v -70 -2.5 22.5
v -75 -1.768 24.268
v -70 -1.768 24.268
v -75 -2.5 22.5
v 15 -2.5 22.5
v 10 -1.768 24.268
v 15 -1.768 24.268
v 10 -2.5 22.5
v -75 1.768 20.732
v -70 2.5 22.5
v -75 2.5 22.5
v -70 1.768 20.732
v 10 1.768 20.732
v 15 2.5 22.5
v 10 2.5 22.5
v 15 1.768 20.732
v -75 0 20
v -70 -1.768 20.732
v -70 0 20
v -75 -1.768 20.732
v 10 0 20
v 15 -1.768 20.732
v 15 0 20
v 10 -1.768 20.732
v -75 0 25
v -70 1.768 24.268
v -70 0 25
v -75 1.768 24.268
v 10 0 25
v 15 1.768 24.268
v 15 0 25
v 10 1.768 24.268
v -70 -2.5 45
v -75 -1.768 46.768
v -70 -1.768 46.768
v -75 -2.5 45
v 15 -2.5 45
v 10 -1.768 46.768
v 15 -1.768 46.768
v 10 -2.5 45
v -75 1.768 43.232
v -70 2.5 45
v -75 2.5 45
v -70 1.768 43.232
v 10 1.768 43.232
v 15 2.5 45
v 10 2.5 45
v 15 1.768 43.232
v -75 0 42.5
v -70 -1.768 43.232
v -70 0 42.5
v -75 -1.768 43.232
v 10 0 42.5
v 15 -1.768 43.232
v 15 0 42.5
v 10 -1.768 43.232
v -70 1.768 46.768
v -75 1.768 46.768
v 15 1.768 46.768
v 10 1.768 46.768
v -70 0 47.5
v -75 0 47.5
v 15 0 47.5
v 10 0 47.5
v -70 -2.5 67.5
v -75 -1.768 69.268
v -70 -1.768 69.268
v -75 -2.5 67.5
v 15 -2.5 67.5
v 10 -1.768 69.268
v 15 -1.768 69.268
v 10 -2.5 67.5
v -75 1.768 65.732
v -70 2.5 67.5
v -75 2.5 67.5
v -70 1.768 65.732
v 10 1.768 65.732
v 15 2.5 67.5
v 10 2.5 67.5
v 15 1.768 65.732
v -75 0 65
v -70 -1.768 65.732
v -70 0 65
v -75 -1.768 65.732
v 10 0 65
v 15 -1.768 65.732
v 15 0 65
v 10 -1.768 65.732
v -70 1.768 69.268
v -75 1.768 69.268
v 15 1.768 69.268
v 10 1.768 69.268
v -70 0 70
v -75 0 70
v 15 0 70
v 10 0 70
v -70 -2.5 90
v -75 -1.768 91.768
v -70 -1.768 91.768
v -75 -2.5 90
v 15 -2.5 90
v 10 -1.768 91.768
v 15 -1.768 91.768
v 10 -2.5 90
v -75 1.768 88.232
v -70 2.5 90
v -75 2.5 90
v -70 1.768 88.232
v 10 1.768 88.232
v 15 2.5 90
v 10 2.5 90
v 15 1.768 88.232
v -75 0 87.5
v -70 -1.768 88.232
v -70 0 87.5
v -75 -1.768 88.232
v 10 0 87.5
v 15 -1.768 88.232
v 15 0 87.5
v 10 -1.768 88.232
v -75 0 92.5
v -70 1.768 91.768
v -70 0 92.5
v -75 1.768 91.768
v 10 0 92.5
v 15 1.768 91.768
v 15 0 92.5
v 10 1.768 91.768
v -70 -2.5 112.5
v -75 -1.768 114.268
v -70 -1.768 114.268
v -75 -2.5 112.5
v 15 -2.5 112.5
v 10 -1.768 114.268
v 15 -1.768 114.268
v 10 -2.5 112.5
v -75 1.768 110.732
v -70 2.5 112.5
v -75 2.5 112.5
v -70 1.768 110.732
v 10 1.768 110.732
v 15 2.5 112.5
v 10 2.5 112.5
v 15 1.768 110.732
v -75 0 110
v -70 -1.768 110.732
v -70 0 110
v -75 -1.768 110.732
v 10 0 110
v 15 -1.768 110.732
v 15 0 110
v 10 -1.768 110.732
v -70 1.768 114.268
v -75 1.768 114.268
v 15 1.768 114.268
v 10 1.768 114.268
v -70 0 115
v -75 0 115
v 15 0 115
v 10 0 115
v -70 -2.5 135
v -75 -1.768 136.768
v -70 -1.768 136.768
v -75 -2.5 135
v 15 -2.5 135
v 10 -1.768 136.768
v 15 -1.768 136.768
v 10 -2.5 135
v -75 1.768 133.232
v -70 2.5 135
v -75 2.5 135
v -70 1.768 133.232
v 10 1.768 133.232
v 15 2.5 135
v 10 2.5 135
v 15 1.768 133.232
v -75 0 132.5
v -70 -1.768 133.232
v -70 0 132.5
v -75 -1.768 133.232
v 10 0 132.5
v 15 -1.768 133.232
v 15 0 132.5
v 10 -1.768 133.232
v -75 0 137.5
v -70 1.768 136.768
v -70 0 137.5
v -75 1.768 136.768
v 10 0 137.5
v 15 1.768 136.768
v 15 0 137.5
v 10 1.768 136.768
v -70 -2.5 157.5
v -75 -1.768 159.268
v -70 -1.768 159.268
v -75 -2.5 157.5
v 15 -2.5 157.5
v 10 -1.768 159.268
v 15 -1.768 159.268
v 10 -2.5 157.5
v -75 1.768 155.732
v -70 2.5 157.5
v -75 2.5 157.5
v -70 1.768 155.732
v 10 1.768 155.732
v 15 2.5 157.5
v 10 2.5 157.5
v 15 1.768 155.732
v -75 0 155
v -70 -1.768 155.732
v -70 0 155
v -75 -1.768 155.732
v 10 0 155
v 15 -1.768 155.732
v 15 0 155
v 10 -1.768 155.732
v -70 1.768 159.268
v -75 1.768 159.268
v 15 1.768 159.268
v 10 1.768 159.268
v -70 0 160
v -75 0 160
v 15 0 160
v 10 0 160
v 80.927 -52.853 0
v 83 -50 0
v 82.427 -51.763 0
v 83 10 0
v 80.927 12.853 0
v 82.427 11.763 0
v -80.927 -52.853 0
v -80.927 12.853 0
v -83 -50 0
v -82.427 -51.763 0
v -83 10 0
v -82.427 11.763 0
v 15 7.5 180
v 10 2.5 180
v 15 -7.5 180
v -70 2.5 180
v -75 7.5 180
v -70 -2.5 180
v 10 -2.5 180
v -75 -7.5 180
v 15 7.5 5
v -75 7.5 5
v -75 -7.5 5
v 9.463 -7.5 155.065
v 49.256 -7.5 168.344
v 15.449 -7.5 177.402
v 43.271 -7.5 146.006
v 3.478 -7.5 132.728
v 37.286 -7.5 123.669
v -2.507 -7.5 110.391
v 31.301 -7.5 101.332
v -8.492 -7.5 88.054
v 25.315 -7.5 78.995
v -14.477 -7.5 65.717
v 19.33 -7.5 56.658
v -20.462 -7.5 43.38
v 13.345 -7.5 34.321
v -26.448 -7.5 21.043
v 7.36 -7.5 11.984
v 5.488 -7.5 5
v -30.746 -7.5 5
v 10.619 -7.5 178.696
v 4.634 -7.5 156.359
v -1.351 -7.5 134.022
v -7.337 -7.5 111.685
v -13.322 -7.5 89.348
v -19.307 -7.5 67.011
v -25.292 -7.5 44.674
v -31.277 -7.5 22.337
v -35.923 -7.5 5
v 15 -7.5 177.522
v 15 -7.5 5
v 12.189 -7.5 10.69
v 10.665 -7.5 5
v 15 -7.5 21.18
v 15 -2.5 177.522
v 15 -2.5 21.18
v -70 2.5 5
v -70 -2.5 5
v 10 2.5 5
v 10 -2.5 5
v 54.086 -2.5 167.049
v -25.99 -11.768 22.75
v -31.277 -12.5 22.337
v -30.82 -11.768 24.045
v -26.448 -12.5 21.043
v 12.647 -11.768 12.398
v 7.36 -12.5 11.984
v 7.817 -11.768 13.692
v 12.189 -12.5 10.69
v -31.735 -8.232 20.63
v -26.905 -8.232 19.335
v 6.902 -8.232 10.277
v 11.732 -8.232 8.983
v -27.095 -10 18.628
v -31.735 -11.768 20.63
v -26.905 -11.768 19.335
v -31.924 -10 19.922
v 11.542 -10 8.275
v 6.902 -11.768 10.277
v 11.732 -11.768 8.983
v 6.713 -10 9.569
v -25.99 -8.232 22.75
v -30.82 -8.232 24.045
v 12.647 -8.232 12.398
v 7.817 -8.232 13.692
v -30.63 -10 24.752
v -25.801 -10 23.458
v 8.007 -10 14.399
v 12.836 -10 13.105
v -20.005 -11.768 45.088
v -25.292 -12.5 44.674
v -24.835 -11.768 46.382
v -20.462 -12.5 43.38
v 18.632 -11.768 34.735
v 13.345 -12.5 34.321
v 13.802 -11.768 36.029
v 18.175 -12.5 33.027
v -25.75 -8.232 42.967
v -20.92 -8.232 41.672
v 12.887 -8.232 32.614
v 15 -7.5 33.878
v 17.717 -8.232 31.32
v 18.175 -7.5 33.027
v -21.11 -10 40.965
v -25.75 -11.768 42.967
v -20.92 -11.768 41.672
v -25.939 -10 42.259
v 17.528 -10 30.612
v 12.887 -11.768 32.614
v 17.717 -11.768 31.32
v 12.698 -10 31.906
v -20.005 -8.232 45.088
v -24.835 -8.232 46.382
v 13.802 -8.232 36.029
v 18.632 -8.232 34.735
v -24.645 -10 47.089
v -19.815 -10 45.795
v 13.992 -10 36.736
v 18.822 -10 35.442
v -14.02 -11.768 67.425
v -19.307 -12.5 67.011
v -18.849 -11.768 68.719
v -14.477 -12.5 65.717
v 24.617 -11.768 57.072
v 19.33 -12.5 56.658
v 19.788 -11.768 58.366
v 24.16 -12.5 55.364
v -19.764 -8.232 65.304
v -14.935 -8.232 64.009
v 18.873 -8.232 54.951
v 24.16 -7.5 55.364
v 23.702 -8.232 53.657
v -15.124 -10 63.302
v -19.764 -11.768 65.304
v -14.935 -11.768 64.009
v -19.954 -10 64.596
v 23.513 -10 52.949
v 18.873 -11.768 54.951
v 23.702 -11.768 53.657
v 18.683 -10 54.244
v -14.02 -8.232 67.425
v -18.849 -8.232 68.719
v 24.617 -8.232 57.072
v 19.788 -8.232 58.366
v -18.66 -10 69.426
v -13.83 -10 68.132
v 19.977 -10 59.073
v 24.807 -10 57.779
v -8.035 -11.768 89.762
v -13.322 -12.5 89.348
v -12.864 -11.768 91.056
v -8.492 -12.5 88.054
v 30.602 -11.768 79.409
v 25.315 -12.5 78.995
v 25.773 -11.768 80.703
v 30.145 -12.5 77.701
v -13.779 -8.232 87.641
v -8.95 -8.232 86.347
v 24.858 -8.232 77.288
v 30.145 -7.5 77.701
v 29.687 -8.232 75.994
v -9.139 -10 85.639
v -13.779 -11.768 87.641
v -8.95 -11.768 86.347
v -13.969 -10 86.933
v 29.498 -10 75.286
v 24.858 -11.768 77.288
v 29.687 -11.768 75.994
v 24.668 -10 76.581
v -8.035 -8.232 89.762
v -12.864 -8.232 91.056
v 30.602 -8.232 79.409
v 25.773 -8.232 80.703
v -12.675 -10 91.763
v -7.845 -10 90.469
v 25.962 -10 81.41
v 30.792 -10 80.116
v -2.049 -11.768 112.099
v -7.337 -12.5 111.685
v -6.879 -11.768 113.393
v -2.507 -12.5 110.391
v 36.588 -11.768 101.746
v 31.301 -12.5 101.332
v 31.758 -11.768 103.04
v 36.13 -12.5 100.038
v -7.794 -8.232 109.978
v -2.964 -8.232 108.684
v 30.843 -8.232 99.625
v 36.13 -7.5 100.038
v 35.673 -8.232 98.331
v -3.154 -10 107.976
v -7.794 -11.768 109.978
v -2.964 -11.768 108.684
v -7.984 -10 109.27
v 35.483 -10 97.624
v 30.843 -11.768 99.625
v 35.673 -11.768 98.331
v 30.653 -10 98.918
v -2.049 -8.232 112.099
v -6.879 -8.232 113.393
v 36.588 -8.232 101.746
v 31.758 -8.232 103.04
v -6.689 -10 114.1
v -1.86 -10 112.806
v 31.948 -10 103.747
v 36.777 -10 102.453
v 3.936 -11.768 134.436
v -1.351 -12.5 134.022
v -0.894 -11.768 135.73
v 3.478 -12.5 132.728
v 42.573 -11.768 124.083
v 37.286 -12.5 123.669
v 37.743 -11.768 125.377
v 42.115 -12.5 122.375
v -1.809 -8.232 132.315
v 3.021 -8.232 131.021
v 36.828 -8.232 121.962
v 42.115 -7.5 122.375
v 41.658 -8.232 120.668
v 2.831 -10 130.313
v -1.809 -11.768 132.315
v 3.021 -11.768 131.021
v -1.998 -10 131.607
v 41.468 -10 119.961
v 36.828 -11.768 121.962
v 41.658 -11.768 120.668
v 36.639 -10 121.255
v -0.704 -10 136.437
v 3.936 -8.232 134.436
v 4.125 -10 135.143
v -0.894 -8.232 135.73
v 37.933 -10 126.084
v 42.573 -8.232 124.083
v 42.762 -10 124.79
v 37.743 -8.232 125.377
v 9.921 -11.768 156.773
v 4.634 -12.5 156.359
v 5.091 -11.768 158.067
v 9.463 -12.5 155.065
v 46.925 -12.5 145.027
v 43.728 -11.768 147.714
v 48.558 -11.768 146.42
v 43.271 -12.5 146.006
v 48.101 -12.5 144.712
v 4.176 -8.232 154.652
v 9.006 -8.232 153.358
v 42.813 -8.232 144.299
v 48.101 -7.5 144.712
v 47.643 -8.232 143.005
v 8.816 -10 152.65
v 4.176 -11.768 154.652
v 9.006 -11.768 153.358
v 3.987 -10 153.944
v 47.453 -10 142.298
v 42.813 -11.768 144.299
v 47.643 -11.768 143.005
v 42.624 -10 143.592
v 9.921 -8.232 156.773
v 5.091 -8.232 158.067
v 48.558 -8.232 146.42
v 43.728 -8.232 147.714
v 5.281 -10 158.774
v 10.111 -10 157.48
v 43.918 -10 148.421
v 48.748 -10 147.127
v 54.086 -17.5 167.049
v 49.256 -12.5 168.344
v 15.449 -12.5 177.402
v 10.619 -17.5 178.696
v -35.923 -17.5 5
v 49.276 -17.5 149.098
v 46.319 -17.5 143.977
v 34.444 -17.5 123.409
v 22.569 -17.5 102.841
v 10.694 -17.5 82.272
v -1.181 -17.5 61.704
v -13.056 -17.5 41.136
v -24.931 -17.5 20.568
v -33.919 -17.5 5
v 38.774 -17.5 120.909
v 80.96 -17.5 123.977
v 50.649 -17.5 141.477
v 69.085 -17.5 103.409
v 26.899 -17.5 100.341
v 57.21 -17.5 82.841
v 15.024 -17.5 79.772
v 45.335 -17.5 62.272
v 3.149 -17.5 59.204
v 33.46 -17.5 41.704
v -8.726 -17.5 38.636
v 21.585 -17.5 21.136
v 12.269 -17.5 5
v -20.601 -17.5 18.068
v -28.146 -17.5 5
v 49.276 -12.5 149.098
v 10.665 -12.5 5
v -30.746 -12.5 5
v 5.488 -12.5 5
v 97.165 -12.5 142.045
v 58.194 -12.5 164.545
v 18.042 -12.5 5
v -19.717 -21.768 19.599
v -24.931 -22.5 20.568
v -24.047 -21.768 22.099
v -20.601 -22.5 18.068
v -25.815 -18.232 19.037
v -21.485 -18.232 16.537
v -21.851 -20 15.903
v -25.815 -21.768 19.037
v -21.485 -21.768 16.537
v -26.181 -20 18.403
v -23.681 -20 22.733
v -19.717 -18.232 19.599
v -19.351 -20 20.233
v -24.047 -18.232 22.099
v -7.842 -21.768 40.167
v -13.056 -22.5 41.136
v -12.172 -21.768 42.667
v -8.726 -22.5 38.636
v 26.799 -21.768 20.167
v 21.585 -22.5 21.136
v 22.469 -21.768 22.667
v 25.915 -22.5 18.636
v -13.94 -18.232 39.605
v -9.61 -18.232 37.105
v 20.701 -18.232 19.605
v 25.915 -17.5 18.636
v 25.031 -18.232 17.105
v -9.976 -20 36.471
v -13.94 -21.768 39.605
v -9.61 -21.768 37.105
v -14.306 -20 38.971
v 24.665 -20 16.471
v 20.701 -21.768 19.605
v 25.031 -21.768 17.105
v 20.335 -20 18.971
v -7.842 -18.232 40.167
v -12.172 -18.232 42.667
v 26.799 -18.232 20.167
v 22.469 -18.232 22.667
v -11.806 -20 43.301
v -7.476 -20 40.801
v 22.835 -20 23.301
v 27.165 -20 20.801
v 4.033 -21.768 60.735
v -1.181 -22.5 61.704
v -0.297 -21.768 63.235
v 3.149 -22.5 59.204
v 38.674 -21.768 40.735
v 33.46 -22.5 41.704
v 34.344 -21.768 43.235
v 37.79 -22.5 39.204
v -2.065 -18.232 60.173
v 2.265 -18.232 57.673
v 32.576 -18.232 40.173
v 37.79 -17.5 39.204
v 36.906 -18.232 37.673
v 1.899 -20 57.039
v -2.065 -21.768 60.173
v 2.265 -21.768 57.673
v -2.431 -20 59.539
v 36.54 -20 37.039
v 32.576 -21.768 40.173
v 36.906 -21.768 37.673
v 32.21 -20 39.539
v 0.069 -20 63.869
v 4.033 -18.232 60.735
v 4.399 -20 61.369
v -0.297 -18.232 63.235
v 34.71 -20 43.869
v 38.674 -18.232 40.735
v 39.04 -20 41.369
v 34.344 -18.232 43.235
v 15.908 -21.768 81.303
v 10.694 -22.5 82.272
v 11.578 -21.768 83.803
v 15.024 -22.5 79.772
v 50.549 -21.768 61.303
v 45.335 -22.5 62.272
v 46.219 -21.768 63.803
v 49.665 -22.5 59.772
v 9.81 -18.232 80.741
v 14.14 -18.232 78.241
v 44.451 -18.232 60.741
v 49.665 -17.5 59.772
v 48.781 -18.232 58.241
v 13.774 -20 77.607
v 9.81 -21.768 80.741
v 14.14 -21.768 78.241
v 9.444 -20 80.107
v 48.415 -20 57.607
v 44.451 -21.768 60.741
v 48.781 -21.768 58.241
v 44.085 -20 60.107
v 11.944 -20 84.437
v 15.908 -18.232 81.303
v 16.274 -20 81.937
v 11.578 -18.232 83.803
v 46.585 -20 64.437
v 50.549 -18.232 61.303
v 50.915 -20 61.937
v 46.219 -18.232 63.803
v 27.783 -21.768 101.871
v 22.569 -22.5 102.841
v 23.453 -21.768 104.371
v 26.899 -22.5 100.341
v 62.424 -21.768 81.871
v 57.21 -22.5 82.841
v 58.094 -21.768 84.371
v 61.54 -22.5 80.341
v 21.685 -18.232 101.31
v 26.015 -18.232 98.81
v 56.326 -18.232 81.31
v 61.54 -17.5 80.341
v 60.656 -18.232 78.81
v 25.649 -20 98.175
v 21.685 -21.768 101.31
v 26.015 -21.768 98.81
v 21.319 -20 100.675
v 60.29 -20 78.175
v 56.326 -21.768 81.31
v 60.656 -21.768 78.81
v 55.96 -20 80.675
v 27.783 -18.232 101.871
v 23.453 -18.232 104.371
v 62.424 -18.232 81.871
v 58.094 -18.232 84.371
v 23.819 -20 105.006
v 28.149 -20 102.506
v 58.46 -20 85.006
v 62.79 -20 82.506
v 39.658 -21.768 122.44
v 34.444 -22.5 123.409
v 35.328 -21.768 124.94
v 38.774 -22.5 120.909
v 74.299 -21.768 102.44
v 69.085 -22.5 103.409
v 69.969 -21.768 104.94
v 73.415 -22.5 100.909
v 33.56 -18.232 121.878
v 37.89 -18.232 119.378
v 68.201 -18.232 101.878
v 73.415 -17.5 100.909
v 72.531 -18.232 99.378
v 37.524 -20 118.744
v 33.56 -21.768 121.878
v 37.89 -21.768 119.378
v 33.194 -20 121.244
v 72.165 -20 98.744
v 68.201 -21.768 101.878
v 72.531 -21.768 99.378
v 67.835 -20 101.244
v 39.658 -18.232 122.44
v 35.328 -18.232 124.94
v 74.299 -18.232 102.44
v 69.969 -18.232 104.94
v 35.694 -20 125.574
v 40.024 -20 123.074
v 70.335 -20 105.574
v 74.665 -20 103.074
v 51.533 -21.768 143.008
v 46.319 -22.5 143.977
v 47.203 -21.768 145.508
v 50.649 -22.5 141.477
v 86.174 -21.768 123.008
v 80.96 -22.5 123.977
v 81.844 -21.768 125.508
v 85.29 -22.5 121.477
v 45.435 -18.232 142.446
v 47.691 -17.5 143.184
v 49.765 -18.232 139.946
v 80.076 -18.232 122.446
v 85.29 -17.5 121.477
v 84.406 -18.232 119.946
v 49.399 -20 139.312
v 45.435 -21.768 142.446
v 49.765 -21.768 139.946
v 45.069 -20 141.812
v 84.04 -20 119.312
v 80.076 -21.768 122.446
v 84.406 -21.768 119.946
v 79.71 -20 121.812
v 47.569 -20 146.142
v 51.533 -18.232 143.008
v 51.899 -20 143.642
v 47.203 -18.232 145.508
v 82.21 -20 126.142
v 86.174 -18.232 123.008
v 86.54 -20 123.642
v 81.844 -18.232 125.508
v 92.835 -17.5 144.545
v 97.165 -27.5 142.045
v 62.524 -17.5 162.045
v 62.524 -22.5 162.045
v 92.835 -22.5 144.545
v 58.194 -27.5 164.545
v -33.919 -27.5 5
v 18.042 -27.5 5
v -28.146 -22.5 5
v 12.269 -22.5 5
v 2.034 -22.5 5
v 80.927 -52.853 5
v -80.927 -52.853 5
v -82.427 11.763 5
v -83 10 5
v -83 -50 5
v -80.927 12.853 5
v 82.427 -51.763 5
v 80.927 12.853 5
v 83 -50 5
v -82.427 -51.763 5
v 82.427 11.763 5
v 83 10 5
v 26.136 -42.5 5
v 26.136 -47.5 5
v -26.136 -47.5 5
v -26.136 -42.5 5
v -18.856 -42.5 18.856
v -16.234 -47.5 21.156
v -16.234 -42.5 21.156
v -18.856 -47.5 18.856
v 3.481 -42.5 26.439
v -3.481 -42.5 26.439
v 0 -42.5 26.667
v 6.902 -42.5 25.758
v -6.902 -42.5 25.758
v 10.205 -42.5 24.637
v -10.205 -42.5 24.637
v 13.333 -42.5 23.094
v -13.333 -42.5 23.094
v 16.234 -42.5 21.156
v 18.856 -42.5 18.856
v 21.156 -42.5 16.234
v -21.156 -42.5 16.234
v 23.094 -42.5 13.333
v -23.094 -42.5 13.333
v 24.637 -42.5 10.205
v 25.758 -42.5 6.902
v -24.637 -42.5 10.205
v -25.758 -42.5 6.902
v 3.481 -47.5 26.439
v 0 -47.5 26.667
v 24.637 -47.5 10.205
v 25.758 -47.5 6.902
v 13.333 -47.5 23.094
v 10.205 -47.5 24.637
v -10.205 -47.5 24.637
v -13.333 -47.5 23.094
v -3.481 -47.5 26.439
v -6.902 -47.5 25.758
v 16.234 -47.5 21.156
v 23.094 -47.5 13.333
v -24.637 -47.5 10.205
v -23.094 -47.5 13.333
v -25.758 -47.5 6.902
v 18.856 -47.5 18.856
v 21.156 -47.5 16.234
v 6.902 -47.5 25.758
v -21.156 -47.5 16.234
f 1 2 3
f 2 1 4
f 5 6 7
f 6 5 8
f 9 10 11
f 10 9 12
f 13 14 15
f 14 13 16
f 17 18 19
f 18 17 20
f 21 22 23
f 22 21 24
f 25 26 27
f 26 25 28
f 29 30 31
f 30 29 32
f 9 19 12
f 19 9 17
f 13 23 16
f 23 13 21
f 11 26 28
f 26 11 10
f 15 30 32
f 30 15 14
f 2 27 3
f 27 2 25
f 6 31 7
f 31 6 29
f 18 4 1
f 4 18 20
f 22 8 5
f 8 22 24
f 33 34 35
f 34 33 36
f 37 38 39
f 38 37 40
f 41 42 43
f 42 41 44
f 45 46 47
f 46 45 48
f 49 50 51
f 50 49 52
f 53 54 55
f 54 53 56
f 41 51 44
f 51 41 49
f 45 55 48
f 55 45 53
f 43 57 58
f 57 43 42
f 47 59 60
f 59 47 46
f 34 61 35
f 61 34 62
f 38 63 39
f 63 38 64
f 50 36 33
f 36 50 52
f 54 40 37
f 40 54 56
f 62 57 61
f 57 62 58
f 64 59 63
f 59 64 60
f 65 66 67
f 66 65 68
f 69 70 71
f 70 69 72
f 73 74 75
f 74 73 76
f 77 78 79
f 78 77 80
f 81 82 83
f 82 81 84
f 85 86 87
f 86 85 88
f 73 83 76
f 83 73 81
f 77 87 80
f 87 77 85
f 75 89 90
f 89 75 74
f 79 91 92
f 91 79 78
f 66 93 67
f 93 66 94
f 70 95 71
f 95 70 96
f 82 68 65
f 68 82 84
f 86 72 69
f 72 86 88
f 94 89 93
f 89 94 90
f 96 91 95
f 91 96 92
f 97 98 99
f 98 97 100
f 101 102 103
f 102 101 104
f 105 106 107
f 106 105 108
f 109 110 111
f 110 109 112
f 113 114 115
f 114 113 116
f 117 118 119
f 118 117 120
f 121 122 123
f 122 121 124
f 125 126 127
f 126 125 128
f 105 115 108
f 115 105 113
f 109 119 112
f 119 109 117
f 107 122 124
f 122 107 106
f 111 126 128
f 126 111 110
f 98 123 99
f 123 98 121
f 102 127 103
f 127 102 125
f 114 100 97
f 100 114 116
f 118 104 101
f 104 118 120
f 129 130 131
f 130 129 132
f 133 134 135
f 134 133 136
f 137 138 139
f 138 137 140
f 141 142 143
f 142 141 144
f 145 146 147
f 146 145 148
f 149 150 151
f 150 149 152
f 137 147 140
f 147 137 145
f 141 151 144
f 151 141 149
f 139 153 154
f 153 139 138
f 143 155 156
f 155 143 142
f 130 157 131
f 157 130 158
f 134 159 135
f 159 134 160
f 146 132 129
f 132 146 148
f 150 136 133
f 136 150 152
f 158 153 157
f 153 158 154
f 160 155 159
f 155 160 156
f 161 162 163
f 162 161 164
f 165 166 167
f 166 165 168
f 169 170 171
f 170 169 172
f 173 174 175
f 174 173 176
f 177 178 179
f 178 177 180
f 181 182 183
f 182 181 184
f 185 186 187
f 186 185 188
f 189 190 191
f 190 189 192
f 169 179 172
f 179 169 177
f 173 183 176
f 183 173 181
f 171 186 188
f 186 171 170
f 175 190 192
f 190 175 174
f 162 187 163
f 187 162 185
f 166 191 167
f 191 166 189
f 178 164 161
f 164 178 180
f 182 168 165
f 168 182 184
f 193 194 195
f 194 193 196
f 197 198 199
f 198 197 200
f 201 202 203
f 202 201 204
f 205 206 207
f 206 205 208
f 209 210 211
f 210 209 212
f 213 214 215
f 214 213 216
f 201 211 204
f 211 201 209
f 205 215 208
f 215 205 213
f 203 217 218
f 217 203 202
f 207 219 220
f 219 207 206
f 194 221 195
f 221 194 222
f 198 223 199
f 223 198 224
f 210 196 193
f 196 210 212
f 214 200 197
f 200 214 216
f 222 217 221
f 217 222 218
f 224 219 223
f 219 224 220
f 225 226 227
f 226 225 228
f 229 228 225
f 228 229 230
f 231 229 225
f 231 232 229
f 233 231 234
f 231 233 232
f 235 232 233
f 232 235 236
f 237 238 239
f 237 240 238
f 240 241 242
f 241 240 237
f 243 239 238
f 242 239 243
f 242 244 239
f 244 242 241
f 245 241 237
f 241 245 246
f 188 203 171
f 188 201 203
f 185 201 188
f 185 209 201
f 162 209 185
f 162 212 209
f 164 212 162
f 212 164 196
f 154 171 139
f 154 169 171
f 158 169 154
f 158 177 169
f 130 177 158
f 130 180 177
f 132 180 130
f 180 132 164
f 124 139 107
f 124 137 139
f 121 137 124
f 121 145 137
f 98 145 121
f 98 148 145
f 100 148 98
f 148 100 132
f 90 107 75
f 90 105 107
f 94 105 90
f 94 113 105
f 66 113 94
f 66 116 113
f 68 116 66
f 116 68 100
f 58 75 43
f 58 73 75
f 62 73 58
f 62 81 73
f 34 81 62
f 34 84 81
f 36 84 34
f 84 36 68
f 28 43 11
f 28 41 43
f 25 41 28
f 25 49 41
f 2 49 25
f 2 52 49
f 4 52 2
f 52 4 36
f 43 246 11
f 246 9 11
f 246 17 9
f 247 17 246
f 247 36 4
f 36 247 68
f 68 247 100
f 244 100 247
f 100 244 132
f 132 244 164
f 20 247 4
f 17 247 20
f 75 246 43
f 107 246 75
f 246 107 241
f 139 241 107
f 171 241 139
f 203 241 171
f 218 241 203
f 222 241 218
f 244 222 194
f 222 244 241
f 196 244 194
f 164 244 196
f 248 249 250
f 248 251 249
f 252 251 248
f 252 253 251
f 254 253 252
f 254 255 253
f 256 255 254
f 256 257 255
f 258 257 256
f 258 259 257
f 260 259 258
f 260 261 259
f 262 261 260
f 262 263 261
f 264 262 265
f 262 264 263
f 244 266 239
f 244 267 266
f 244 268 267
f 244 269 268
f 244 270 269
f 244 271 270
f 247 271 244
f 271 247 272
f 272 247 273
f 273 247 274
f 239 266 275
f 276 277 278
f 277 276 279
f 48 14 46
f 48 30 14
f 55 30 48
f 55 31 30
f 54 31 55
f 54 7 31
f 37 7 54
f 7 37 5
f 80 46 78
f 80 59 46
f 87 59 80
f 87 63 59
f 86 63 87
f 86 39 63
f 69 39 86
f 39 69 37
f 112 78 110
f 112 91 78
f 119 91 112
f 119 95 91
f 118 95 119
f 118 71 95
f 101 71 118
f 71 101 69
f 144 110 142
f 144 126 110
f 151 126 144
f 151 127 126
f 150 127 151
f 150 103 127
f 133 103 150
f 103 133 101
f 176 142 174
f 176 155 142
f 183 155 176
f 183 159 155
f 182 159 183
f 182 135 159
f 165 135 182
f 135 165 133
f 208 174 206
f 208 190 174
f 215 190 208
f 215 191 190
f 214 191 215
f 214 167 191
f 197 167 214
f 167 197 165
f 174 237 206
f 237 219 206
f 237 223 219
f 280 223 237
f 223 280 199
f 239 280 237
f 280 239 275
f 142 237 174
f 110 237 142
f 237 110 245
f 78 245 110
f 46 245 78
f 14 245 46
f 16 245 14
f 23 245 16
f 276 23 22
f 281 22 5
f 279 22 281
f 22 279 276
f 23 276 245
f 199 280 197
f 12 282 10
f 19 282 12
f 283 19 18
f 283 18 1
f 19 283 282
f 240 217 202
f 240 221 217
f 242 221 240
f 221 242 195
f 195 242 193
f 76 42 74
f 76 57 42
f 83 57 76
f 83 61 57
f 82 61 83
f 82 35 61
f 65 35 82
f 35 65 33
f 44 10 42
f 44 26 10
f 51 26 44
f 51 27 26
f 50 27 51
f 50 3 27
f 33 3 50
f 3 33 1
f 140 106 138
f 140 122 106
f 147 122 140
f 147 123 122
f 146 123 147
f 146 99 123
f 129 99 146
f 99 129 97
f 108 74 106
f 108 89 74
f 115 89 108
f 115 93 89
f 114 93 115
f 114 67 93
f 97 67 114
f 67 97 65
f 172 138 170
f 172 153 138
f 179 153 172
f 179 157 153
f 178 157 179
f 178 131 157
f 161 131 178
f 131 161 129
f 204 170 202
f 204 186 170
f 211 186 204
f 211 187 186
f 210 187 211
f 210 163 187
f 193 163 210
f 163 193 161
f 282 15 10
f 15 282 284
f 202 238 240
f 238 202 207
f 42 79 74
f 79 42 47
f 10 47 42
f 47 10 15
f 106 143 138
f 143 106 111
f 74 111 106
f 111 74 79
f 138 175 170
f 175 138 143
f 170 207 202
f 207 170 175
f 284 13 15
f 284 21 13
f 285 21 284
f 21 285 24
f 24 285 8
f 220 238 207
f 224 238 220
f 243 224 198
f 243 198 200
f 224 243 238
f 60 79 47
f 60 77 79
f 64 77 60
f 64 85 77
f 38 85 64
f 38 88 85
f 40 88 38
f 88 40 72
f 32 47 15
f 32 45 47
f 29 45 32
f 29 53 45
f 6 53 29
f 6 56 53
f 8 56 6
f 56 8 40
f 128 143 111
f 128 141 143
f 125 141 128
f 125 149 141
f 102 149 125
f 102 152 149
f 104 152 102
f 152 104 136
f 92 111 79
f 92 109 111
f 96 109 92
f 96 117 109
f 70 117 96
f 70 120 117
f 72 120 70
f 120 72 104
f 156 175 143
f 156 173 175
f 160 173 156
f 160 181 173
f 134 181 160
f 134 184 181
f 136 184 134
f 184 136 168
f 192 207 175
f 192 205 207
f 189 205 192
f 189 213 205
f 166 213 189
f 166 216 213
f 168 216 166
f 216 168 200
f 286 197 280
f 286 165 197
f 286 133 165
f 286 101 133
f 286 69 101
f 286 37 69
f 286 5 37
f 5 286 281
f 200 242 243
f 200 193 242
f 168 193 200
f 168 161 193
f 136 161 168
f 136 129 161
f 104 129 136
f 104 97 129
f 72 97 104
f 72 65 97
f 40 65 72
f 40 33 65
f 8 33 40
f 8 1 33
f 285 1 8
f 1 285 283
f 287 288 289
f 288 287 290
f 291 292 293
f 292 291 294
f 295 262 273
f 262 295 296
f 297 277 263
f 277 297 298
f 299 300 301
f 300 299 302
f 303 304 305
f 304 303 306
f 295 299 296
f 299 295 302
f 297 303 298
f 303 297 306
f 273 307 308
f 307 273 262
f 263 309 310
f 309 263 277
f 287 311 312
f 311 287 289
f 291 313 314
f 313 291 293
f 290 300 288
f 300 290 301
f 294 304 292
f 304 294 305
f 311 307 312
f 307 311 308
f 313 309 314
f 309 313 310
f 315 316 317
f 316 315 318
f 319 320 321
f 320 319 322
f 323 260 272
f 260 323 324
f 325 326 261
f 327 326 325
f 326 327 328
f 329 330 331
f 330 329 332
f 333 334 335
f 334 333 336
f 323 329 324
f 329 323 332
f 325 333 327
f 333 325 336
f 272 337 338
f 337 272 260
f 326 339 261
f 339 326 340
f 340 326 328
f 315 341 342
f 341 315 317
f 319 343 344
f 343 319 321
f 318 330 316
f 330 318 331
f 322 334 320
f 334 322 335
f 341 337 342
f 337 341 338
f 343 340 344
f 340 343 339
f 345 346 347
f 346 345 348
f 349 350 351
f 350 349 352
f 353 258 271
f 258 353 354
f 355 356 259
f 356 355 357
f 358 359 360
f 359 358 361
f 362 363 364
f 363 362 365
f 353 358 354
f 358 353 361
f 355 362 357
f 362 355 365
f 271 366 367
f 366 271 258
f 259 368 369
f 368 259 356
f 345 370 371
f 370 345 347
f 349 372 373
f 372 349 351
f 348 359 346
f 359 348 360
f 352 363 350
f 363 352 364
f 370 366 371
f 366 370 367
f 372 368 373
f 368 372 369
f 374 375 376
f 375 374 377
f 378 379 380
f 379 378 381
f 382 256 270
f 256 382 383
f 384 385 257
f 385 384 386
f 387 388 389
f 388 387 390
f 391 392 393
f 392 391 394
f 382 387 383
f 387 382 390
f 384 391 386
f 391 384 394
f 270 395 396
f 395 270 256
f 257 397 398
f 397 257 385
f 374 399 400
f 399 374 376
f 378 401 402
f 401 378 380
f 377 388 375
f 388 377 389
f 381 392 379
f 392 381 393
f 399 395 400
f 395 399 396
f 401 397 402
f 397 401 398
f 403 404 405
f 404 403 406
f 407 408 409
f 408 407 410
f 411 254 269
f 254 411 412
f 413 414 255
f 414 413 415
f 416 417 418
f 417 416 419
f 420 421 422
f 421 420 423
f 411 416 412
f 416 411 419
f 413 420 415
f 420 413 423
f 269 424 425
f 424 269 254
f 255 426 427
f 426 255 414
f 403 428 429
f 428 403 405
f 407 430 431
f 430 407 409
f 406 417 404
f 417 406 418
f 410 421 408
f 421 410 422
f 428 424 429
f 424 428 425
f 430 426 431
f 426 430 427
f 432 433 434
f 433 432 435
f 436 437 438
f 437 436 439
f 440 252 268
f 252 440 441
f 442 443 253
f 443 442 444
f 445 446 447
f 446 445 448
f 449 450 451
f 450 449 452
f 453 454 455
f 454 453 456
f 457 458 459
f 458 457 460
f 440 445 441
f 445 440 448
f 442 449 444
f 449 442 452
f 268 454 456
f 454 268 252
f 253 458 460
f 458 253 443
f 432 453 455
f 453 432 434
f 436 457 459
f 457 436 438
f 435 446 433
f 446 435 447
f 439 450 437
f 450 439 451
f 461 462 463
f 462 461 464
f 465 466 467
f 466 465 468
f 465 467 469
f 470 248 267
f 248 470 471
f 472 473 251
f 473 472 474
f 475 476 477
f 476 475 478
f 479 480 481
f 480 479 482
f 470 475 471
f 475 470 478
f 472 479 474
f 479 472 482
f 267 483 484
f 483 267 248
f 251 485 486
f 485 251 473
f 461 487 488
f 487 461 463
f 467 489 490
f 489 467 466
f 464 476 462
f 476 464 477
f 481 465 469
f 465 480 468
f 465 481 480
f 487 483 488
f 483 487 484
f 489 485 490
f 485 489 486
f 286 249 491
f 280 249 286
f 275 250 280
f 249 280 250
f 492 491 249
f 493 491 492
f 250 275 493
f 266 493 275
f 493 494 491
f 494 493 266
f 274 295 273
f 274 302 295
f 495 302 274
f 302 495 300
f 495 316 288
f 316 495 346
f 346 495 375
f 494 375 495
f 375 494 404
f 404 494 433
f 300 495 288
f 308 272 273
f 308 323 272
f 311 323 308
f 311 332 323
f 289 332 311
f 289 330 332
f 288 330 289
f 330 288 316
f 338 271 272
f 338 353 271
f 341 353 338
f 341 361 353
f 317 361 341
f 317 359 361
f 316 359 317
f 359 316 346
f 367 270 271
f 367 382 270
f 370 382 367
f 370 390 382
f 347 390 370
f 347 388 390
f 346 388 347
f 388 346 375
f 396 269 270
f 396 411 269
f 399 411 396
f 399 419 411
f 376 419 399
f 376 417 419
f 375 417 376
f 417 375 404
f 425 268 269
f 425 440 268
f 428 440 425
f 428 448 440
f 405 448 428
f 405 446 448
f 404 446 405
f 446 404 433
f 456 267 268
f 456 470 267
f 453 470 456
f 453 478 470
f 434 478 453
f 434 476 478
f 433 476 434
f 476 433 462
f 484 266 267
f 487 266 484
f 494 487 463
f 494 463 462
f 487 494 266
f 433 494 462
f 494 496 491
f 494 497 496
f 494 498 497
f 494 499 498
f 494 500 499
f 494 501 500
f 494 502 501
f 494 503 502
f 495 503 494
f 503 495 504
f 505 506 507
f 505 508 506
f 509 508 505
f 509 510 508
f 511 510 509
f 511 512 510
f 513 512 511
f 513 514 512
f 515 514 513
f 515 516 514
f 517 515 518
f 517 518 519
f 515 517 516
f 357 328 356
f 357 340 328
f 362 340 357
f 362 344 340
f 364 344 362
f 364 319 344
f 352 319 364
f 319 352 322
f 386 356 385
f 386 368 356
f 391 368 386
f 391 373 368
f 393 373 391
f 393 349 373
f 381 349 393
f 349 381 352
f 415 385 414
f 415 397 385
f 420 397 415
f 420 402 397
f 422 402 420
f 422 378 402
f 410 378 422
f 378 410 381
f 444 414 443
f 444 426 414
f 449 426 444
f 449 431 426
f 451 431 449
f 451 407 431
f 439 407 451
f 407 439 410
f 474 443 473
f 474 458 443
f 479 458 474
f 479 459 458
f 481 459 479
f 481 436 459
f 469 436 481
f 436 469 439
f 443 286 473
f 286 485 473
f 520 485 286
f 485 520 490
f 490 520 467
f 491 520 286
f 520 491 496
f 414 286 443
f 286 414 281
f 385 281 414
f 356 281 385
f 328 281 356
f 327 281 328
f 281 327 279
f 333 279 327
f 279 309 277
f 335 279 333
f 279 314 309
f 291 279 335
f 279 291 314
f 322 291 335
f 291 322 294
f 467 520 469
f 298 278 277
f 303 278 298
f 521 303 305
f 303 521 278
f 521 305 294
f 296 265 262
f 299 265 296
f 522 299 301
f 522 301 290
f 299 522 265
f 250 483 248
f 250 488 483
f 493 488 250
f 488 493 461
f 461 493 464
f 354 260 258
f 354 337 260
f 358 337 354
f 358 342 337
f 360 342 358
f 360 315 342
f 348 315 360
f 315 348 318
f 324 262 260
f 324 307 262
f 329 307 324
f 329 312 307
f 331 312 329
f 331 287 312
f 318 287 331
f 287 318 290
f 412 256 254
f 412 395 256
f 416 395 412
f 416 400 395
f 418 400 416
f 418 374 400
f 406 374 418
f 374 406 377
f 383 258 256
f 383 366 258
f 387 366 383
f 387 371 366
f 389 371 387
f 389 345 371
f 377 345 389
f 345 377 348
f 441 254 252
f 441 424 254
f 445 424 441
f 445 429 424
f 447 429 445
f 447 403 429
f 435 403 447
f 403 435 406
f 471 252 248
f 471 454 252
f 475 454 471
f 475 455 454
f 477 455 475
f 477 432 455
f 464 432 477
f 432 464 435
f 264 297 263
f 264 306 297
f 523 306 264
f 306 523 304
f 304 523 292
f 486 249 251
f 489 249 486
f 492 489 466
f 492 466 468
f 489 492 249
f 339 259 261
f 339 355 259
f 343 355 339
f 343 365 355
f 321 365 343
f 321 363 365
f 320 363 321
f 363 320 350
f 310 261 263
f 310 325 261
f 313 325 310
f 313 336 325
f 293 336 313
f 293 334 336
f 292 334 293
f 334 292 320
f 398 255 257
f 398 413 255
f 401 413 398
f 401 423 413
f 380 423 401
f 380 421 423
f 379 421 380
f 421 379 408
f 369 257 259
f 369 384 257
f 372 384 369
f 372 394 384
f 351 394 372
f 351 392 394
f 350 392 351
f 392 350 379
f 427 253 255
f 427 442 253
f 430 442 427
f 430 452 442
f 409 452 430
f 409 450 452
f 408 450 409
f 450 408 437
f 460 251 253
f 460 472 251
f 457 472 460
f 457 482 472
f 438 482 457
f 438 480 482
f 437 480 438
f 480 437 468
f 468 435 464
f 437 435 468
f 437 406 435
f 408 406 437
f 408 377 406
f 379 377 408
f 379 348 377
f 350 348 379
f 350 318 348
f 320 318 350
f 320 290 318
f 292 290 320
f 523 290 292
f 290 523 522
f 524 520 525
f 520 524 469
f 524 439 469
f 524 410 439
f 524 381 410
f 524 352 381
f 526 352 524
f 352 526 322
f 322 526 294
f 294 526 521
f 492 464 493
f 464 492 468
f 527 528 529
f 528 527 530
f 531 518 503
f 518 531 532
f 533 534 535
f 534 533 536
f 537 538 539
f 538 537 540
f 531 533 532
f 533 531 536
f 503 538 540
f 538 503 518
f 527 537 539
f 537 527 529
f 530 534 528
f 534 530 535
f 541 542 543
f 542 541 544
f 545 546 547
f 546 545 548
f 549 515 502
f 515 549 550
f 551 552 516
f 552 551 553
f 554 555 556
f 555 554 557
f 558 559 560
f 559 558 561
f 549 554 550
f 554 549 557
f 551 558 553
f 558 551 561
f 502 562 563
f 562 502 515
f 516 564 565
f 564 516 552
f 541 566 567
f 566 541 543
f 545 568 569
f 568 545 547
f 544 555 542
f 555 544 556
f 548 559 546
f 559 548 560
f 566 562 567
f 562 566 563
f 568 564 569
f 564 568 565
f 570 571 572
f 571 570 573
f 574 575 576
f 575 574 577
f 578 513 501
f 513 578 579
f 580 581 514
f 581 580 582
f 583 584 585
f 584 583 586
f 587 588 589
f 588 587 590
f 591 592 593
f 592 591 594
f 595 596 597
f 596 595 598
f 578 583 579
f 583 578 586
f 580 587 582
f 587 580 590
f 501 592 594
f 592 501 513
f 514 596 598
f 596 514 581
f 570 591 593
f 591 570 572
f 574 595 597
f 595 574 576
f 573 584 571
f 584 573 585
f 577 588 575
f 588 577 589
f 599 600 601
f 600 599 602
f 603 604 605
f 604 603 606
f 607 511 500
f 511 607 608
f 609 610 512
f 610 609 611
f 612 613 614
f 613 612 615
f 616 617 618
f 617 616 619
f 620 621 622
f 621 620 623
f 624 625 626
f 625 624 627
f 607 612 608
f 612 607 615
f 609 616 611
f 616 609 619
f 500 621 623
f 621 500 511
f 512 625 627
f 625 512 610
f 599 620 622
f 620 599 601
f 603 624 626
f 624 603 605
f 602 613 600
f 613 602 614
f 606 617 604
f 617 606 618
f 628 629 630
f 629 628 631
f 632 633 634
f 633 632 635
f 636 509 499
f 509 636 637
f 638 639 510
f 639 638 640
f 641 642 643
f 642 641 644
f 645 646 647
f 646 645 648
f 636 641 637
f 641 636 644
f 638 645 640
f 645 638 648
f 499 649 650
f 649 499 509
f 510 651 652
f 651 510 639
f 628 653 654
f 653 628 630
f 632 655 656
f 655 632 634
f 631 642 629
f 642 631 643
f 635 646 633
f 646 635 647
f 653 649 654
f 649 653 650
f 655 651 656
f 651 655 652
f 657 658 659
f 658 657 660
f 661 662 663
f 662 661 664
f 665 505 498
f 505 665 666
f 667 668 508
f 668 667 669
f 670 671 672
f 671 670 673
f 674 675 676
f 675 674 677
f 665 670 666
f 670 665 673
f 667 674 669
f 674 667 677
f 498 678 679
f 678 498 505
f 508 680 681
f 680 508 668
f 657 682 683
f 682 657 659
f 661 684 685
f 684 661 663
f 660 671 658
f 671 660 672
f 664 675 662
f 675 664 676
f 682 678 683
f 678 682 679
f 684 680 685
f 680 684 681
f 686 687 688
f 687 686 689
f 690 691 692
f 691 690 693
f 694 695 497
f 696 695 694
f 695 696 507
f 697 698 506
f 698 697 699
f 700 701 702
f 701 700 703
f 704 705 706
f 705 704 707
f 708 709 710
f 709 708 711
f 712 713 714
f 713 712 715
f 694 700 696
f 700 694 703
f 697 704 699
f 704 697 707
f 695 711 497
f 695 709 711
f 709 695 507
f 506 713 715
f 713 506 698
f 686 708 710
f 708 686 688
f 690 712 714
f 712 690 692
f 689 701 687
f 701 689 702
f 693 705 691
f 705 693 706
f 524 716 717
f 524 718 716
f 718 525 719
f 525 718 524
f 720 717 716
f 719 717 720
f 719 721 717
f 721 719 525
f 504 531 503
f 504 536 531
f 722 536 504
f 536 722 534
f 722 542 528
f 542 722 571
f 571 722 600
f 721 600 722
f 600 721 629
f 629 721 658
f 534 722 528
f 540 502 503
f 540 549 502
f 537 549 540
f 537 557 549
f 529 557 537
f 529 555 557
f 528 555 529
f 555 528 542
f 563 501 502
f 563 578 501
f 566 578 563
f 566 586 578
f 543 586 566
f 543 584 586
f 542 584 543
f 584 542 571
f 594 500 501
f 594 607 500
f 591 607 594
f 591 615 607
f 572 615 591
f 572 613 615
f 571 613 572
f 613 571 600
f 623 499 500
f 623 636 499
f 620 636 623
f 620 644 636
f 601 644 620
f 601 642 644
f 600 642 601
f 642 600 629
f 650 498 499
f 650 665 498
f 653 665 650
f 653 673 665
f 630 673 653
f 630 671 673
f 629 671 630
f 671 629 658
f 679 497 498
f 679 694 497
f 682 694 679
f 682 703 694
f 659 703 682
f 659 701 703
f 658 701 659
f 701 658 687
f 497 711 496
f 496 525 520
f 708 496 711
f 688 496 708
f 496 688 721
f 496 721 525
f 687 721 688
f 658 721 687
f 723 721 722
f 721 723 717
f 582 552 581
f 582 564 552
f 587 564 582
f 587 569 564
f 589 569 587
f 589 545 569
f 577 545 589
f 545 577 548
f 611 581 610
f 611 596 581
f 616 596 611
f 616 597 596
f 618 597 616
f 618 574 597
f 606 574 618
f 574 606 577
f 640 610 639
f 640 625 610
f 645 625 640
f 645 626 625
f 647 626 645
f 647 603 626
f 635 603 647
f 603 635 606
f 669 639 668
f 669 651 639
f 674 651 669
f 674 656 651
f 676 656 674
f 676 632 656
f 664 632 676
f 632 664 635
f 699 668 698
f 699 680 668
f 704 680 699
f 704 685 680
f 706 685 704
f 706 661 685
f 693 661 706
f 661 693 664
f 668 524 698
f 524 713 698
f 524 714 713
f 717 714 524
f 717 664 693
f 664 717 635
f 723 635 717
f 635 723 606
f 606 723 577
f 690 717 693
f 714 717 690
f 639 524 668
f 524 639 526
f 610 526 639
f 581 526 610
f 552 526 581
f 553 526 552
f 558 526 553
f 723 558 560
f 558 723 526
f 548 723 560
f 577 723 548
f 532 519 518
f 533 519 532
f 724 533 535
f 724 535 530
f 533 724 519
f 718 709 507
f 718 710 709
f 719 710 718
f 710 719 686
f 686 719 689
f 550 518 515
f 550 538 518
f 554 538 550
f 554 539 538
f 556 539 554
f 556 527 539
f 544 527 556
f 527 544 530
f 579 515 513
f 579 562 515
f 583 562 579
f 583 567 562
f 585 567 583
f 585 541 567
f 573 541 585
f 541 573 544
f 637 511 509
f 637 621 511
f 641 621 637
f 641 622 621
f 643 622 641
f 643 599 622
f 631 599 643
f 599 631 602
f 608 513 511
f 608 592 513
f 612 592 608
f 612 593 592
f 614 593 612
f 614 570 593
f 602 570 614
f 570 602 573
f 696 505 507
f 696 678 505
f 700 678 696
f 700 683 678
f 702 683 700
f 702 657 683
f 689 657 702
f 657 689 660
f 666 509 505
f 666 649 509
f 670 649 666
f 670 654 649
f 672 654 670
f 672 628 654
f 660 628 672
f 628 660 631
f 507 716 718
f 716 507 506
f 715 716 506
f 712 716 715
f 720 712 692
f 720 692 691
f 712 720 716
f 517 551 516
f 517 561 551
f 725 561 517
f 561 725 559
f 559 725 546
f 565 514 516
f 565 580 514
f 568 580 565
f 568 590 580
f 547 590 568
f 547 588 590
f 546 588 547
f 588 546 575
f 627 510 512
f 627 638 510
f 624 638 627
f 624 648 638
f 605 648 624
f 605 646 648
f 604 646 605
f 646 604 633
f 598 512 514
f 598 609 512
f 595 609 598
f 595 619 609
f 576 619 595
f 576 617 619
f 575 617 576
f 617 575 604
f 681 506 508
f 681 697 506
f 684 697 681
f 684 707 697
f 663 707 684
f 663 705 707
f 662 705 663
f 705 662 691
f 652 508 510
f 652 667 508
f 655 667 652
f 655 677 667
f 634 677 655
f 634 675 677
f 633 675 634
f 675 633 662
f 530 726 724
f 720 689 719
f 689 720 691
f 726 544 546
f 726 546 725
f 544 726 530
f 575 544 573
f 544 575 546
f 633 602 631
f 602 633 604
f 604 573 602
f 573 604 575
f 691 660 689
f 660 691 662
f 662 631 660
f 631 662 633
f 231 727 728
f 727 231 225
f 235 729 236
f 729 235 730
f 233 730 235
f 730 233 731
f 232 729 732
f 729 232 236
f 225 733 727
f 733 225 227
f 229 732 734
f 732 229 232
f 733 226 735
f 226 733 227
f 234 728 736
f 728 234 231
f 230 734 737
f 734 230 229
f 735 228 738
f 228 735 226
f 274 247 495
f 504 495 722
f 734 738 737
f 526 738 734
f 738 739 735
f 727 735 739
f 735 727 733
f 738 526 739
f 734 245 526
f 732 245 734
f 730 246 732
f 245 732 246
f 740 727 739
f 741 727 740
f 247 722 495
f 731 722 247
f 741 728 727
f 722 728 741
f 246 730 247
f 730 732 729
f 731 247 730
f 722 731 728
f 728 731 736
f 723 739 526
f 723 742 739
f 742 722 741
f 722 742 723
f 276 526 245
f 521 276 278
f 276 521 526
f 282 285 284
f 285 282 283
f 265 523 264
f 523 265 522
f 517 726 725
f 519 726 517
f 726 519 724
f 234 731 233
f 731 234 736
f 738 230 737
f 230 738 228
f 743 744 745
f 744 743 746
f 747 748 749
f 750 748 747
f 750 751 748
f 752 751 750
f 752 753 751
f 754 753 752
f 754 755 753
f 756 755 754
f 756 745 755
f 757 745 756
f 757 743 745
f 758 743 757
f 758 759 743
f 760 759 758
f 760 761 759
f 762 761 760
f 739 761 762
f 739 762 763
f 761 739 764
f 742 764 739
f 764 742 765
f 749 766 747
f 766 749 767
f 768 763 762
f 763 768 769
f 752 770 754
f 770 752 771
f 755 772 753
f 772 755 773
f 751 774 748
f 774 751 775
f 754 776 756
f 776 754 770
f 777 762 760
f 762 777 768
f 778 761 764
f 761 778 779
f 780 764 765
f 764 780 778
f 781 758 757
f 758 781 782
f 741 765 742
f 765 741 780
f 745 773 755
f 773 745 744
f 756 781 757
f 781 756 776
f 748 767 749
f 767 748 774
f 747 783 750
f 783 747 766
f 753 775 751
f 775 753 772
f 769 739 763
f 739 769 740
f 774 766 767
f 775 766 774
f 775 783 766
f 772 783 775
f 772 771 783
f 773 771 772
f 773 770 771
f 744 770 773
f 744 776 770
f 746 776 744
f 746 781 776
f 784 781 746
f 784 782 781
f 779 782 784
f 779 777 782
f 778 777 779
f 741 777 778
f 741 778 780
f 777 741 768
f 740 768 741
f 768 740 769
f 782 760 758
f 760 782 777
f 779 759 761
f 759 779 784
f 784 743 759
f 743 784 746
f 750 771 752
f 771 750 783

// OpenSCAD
cutting_board_thicnkess = 15;

bottom_length = 160;
bottom_height = 5;

edge_width = 5;
slot_width = 5;

knife_1_length = 180;
knife_1_width = 80;

knife_2_length = 185;
knife_2_width = 35;

knife_3_length = 190;
knife_3_width = 35;

module cutting_board_knife_rack(knifes, bottom_length, bottom_height, edge_width, slot_width, offset_angle = 15) {

    offset_y = slot_width + edge_width;
    len_of_knifes = len(knifes);

    bottom_width = offset_y * len_of_knifes + cutting_board_thicnkess + edge_width * 2 + slot_width;

    for(i = [0:len_of_knifes - 1]) {

        a = offset_angle * i;
        offset_z = (knifes[i][1] + 2 * edge_width) * sin(a);
        w = (knifes[i][1] + 2 * edge_width) / cos(a) * 2;

        translate([0, -offset_y * i, 0]) difference() {
            // a knife holder
            translate([-w / 6 , 0, -0.5 * offset_z]) rotate([0, a, 0]) difference() {
                linear_extrude(knifes[i][0]) difference() {
                    square([
                        knifes[i][1] + 2 * edge_width, 
                        slot_width + 2 * edge_width
                    ], center = true);
                        
                    square([knifes[i][1], slot_width], center = true);
                }
                
                // vents
                for(j = [0:7]) {
                    translate([0, 0, knifes[i][0] / 8 * j]) 
                        rotate([0, 90, 0]) 
                            linear_extrude(knifes[i][0], center = true) 
                                circle(slot_width / 2);
                }
            }
            
            // cut off the bottom of the holder
            translate([0, 0, -offset_z]) 
                linear_extrude(offset_z) 
                   square([w, slot_width + 2 * edge_width], center = true);
        }

    }

    // rack bottom
    translate([0, -bottom_width / 2 + edge_width + slot_width, 0]) 
        linear_extrude(bottom_height) minkowski() {
        
        square([bottom_length, bottom_width], center = true);
        circle(bottom_width / 20);
    }

    // cutting board holder
    translate([0, -offset_y * len_of_knifes - cutting_board_thicnkess, 0]) 
        rotate([-90, 0, 0]) linear_extrude(edge_width, center = true) difference() {
        
        circle(bottom_length / 6, $fn = 48);
        
        translate([-bottom_length / 4, 0, 0]) 
            square([bottom_length / 2, bottom_length / 2]);
    }

}

cutting_board_knife_rack(
    [
        [knife_1_length, knife_1_width], 
        [knife_2_length, knife_2_width], 
        [knife_3_length, knife_3_width]
    ], 
    bottom_length, 
    bottom_height, 
    edge_width, 
    slot_width,
    15 // offset_angle
);
